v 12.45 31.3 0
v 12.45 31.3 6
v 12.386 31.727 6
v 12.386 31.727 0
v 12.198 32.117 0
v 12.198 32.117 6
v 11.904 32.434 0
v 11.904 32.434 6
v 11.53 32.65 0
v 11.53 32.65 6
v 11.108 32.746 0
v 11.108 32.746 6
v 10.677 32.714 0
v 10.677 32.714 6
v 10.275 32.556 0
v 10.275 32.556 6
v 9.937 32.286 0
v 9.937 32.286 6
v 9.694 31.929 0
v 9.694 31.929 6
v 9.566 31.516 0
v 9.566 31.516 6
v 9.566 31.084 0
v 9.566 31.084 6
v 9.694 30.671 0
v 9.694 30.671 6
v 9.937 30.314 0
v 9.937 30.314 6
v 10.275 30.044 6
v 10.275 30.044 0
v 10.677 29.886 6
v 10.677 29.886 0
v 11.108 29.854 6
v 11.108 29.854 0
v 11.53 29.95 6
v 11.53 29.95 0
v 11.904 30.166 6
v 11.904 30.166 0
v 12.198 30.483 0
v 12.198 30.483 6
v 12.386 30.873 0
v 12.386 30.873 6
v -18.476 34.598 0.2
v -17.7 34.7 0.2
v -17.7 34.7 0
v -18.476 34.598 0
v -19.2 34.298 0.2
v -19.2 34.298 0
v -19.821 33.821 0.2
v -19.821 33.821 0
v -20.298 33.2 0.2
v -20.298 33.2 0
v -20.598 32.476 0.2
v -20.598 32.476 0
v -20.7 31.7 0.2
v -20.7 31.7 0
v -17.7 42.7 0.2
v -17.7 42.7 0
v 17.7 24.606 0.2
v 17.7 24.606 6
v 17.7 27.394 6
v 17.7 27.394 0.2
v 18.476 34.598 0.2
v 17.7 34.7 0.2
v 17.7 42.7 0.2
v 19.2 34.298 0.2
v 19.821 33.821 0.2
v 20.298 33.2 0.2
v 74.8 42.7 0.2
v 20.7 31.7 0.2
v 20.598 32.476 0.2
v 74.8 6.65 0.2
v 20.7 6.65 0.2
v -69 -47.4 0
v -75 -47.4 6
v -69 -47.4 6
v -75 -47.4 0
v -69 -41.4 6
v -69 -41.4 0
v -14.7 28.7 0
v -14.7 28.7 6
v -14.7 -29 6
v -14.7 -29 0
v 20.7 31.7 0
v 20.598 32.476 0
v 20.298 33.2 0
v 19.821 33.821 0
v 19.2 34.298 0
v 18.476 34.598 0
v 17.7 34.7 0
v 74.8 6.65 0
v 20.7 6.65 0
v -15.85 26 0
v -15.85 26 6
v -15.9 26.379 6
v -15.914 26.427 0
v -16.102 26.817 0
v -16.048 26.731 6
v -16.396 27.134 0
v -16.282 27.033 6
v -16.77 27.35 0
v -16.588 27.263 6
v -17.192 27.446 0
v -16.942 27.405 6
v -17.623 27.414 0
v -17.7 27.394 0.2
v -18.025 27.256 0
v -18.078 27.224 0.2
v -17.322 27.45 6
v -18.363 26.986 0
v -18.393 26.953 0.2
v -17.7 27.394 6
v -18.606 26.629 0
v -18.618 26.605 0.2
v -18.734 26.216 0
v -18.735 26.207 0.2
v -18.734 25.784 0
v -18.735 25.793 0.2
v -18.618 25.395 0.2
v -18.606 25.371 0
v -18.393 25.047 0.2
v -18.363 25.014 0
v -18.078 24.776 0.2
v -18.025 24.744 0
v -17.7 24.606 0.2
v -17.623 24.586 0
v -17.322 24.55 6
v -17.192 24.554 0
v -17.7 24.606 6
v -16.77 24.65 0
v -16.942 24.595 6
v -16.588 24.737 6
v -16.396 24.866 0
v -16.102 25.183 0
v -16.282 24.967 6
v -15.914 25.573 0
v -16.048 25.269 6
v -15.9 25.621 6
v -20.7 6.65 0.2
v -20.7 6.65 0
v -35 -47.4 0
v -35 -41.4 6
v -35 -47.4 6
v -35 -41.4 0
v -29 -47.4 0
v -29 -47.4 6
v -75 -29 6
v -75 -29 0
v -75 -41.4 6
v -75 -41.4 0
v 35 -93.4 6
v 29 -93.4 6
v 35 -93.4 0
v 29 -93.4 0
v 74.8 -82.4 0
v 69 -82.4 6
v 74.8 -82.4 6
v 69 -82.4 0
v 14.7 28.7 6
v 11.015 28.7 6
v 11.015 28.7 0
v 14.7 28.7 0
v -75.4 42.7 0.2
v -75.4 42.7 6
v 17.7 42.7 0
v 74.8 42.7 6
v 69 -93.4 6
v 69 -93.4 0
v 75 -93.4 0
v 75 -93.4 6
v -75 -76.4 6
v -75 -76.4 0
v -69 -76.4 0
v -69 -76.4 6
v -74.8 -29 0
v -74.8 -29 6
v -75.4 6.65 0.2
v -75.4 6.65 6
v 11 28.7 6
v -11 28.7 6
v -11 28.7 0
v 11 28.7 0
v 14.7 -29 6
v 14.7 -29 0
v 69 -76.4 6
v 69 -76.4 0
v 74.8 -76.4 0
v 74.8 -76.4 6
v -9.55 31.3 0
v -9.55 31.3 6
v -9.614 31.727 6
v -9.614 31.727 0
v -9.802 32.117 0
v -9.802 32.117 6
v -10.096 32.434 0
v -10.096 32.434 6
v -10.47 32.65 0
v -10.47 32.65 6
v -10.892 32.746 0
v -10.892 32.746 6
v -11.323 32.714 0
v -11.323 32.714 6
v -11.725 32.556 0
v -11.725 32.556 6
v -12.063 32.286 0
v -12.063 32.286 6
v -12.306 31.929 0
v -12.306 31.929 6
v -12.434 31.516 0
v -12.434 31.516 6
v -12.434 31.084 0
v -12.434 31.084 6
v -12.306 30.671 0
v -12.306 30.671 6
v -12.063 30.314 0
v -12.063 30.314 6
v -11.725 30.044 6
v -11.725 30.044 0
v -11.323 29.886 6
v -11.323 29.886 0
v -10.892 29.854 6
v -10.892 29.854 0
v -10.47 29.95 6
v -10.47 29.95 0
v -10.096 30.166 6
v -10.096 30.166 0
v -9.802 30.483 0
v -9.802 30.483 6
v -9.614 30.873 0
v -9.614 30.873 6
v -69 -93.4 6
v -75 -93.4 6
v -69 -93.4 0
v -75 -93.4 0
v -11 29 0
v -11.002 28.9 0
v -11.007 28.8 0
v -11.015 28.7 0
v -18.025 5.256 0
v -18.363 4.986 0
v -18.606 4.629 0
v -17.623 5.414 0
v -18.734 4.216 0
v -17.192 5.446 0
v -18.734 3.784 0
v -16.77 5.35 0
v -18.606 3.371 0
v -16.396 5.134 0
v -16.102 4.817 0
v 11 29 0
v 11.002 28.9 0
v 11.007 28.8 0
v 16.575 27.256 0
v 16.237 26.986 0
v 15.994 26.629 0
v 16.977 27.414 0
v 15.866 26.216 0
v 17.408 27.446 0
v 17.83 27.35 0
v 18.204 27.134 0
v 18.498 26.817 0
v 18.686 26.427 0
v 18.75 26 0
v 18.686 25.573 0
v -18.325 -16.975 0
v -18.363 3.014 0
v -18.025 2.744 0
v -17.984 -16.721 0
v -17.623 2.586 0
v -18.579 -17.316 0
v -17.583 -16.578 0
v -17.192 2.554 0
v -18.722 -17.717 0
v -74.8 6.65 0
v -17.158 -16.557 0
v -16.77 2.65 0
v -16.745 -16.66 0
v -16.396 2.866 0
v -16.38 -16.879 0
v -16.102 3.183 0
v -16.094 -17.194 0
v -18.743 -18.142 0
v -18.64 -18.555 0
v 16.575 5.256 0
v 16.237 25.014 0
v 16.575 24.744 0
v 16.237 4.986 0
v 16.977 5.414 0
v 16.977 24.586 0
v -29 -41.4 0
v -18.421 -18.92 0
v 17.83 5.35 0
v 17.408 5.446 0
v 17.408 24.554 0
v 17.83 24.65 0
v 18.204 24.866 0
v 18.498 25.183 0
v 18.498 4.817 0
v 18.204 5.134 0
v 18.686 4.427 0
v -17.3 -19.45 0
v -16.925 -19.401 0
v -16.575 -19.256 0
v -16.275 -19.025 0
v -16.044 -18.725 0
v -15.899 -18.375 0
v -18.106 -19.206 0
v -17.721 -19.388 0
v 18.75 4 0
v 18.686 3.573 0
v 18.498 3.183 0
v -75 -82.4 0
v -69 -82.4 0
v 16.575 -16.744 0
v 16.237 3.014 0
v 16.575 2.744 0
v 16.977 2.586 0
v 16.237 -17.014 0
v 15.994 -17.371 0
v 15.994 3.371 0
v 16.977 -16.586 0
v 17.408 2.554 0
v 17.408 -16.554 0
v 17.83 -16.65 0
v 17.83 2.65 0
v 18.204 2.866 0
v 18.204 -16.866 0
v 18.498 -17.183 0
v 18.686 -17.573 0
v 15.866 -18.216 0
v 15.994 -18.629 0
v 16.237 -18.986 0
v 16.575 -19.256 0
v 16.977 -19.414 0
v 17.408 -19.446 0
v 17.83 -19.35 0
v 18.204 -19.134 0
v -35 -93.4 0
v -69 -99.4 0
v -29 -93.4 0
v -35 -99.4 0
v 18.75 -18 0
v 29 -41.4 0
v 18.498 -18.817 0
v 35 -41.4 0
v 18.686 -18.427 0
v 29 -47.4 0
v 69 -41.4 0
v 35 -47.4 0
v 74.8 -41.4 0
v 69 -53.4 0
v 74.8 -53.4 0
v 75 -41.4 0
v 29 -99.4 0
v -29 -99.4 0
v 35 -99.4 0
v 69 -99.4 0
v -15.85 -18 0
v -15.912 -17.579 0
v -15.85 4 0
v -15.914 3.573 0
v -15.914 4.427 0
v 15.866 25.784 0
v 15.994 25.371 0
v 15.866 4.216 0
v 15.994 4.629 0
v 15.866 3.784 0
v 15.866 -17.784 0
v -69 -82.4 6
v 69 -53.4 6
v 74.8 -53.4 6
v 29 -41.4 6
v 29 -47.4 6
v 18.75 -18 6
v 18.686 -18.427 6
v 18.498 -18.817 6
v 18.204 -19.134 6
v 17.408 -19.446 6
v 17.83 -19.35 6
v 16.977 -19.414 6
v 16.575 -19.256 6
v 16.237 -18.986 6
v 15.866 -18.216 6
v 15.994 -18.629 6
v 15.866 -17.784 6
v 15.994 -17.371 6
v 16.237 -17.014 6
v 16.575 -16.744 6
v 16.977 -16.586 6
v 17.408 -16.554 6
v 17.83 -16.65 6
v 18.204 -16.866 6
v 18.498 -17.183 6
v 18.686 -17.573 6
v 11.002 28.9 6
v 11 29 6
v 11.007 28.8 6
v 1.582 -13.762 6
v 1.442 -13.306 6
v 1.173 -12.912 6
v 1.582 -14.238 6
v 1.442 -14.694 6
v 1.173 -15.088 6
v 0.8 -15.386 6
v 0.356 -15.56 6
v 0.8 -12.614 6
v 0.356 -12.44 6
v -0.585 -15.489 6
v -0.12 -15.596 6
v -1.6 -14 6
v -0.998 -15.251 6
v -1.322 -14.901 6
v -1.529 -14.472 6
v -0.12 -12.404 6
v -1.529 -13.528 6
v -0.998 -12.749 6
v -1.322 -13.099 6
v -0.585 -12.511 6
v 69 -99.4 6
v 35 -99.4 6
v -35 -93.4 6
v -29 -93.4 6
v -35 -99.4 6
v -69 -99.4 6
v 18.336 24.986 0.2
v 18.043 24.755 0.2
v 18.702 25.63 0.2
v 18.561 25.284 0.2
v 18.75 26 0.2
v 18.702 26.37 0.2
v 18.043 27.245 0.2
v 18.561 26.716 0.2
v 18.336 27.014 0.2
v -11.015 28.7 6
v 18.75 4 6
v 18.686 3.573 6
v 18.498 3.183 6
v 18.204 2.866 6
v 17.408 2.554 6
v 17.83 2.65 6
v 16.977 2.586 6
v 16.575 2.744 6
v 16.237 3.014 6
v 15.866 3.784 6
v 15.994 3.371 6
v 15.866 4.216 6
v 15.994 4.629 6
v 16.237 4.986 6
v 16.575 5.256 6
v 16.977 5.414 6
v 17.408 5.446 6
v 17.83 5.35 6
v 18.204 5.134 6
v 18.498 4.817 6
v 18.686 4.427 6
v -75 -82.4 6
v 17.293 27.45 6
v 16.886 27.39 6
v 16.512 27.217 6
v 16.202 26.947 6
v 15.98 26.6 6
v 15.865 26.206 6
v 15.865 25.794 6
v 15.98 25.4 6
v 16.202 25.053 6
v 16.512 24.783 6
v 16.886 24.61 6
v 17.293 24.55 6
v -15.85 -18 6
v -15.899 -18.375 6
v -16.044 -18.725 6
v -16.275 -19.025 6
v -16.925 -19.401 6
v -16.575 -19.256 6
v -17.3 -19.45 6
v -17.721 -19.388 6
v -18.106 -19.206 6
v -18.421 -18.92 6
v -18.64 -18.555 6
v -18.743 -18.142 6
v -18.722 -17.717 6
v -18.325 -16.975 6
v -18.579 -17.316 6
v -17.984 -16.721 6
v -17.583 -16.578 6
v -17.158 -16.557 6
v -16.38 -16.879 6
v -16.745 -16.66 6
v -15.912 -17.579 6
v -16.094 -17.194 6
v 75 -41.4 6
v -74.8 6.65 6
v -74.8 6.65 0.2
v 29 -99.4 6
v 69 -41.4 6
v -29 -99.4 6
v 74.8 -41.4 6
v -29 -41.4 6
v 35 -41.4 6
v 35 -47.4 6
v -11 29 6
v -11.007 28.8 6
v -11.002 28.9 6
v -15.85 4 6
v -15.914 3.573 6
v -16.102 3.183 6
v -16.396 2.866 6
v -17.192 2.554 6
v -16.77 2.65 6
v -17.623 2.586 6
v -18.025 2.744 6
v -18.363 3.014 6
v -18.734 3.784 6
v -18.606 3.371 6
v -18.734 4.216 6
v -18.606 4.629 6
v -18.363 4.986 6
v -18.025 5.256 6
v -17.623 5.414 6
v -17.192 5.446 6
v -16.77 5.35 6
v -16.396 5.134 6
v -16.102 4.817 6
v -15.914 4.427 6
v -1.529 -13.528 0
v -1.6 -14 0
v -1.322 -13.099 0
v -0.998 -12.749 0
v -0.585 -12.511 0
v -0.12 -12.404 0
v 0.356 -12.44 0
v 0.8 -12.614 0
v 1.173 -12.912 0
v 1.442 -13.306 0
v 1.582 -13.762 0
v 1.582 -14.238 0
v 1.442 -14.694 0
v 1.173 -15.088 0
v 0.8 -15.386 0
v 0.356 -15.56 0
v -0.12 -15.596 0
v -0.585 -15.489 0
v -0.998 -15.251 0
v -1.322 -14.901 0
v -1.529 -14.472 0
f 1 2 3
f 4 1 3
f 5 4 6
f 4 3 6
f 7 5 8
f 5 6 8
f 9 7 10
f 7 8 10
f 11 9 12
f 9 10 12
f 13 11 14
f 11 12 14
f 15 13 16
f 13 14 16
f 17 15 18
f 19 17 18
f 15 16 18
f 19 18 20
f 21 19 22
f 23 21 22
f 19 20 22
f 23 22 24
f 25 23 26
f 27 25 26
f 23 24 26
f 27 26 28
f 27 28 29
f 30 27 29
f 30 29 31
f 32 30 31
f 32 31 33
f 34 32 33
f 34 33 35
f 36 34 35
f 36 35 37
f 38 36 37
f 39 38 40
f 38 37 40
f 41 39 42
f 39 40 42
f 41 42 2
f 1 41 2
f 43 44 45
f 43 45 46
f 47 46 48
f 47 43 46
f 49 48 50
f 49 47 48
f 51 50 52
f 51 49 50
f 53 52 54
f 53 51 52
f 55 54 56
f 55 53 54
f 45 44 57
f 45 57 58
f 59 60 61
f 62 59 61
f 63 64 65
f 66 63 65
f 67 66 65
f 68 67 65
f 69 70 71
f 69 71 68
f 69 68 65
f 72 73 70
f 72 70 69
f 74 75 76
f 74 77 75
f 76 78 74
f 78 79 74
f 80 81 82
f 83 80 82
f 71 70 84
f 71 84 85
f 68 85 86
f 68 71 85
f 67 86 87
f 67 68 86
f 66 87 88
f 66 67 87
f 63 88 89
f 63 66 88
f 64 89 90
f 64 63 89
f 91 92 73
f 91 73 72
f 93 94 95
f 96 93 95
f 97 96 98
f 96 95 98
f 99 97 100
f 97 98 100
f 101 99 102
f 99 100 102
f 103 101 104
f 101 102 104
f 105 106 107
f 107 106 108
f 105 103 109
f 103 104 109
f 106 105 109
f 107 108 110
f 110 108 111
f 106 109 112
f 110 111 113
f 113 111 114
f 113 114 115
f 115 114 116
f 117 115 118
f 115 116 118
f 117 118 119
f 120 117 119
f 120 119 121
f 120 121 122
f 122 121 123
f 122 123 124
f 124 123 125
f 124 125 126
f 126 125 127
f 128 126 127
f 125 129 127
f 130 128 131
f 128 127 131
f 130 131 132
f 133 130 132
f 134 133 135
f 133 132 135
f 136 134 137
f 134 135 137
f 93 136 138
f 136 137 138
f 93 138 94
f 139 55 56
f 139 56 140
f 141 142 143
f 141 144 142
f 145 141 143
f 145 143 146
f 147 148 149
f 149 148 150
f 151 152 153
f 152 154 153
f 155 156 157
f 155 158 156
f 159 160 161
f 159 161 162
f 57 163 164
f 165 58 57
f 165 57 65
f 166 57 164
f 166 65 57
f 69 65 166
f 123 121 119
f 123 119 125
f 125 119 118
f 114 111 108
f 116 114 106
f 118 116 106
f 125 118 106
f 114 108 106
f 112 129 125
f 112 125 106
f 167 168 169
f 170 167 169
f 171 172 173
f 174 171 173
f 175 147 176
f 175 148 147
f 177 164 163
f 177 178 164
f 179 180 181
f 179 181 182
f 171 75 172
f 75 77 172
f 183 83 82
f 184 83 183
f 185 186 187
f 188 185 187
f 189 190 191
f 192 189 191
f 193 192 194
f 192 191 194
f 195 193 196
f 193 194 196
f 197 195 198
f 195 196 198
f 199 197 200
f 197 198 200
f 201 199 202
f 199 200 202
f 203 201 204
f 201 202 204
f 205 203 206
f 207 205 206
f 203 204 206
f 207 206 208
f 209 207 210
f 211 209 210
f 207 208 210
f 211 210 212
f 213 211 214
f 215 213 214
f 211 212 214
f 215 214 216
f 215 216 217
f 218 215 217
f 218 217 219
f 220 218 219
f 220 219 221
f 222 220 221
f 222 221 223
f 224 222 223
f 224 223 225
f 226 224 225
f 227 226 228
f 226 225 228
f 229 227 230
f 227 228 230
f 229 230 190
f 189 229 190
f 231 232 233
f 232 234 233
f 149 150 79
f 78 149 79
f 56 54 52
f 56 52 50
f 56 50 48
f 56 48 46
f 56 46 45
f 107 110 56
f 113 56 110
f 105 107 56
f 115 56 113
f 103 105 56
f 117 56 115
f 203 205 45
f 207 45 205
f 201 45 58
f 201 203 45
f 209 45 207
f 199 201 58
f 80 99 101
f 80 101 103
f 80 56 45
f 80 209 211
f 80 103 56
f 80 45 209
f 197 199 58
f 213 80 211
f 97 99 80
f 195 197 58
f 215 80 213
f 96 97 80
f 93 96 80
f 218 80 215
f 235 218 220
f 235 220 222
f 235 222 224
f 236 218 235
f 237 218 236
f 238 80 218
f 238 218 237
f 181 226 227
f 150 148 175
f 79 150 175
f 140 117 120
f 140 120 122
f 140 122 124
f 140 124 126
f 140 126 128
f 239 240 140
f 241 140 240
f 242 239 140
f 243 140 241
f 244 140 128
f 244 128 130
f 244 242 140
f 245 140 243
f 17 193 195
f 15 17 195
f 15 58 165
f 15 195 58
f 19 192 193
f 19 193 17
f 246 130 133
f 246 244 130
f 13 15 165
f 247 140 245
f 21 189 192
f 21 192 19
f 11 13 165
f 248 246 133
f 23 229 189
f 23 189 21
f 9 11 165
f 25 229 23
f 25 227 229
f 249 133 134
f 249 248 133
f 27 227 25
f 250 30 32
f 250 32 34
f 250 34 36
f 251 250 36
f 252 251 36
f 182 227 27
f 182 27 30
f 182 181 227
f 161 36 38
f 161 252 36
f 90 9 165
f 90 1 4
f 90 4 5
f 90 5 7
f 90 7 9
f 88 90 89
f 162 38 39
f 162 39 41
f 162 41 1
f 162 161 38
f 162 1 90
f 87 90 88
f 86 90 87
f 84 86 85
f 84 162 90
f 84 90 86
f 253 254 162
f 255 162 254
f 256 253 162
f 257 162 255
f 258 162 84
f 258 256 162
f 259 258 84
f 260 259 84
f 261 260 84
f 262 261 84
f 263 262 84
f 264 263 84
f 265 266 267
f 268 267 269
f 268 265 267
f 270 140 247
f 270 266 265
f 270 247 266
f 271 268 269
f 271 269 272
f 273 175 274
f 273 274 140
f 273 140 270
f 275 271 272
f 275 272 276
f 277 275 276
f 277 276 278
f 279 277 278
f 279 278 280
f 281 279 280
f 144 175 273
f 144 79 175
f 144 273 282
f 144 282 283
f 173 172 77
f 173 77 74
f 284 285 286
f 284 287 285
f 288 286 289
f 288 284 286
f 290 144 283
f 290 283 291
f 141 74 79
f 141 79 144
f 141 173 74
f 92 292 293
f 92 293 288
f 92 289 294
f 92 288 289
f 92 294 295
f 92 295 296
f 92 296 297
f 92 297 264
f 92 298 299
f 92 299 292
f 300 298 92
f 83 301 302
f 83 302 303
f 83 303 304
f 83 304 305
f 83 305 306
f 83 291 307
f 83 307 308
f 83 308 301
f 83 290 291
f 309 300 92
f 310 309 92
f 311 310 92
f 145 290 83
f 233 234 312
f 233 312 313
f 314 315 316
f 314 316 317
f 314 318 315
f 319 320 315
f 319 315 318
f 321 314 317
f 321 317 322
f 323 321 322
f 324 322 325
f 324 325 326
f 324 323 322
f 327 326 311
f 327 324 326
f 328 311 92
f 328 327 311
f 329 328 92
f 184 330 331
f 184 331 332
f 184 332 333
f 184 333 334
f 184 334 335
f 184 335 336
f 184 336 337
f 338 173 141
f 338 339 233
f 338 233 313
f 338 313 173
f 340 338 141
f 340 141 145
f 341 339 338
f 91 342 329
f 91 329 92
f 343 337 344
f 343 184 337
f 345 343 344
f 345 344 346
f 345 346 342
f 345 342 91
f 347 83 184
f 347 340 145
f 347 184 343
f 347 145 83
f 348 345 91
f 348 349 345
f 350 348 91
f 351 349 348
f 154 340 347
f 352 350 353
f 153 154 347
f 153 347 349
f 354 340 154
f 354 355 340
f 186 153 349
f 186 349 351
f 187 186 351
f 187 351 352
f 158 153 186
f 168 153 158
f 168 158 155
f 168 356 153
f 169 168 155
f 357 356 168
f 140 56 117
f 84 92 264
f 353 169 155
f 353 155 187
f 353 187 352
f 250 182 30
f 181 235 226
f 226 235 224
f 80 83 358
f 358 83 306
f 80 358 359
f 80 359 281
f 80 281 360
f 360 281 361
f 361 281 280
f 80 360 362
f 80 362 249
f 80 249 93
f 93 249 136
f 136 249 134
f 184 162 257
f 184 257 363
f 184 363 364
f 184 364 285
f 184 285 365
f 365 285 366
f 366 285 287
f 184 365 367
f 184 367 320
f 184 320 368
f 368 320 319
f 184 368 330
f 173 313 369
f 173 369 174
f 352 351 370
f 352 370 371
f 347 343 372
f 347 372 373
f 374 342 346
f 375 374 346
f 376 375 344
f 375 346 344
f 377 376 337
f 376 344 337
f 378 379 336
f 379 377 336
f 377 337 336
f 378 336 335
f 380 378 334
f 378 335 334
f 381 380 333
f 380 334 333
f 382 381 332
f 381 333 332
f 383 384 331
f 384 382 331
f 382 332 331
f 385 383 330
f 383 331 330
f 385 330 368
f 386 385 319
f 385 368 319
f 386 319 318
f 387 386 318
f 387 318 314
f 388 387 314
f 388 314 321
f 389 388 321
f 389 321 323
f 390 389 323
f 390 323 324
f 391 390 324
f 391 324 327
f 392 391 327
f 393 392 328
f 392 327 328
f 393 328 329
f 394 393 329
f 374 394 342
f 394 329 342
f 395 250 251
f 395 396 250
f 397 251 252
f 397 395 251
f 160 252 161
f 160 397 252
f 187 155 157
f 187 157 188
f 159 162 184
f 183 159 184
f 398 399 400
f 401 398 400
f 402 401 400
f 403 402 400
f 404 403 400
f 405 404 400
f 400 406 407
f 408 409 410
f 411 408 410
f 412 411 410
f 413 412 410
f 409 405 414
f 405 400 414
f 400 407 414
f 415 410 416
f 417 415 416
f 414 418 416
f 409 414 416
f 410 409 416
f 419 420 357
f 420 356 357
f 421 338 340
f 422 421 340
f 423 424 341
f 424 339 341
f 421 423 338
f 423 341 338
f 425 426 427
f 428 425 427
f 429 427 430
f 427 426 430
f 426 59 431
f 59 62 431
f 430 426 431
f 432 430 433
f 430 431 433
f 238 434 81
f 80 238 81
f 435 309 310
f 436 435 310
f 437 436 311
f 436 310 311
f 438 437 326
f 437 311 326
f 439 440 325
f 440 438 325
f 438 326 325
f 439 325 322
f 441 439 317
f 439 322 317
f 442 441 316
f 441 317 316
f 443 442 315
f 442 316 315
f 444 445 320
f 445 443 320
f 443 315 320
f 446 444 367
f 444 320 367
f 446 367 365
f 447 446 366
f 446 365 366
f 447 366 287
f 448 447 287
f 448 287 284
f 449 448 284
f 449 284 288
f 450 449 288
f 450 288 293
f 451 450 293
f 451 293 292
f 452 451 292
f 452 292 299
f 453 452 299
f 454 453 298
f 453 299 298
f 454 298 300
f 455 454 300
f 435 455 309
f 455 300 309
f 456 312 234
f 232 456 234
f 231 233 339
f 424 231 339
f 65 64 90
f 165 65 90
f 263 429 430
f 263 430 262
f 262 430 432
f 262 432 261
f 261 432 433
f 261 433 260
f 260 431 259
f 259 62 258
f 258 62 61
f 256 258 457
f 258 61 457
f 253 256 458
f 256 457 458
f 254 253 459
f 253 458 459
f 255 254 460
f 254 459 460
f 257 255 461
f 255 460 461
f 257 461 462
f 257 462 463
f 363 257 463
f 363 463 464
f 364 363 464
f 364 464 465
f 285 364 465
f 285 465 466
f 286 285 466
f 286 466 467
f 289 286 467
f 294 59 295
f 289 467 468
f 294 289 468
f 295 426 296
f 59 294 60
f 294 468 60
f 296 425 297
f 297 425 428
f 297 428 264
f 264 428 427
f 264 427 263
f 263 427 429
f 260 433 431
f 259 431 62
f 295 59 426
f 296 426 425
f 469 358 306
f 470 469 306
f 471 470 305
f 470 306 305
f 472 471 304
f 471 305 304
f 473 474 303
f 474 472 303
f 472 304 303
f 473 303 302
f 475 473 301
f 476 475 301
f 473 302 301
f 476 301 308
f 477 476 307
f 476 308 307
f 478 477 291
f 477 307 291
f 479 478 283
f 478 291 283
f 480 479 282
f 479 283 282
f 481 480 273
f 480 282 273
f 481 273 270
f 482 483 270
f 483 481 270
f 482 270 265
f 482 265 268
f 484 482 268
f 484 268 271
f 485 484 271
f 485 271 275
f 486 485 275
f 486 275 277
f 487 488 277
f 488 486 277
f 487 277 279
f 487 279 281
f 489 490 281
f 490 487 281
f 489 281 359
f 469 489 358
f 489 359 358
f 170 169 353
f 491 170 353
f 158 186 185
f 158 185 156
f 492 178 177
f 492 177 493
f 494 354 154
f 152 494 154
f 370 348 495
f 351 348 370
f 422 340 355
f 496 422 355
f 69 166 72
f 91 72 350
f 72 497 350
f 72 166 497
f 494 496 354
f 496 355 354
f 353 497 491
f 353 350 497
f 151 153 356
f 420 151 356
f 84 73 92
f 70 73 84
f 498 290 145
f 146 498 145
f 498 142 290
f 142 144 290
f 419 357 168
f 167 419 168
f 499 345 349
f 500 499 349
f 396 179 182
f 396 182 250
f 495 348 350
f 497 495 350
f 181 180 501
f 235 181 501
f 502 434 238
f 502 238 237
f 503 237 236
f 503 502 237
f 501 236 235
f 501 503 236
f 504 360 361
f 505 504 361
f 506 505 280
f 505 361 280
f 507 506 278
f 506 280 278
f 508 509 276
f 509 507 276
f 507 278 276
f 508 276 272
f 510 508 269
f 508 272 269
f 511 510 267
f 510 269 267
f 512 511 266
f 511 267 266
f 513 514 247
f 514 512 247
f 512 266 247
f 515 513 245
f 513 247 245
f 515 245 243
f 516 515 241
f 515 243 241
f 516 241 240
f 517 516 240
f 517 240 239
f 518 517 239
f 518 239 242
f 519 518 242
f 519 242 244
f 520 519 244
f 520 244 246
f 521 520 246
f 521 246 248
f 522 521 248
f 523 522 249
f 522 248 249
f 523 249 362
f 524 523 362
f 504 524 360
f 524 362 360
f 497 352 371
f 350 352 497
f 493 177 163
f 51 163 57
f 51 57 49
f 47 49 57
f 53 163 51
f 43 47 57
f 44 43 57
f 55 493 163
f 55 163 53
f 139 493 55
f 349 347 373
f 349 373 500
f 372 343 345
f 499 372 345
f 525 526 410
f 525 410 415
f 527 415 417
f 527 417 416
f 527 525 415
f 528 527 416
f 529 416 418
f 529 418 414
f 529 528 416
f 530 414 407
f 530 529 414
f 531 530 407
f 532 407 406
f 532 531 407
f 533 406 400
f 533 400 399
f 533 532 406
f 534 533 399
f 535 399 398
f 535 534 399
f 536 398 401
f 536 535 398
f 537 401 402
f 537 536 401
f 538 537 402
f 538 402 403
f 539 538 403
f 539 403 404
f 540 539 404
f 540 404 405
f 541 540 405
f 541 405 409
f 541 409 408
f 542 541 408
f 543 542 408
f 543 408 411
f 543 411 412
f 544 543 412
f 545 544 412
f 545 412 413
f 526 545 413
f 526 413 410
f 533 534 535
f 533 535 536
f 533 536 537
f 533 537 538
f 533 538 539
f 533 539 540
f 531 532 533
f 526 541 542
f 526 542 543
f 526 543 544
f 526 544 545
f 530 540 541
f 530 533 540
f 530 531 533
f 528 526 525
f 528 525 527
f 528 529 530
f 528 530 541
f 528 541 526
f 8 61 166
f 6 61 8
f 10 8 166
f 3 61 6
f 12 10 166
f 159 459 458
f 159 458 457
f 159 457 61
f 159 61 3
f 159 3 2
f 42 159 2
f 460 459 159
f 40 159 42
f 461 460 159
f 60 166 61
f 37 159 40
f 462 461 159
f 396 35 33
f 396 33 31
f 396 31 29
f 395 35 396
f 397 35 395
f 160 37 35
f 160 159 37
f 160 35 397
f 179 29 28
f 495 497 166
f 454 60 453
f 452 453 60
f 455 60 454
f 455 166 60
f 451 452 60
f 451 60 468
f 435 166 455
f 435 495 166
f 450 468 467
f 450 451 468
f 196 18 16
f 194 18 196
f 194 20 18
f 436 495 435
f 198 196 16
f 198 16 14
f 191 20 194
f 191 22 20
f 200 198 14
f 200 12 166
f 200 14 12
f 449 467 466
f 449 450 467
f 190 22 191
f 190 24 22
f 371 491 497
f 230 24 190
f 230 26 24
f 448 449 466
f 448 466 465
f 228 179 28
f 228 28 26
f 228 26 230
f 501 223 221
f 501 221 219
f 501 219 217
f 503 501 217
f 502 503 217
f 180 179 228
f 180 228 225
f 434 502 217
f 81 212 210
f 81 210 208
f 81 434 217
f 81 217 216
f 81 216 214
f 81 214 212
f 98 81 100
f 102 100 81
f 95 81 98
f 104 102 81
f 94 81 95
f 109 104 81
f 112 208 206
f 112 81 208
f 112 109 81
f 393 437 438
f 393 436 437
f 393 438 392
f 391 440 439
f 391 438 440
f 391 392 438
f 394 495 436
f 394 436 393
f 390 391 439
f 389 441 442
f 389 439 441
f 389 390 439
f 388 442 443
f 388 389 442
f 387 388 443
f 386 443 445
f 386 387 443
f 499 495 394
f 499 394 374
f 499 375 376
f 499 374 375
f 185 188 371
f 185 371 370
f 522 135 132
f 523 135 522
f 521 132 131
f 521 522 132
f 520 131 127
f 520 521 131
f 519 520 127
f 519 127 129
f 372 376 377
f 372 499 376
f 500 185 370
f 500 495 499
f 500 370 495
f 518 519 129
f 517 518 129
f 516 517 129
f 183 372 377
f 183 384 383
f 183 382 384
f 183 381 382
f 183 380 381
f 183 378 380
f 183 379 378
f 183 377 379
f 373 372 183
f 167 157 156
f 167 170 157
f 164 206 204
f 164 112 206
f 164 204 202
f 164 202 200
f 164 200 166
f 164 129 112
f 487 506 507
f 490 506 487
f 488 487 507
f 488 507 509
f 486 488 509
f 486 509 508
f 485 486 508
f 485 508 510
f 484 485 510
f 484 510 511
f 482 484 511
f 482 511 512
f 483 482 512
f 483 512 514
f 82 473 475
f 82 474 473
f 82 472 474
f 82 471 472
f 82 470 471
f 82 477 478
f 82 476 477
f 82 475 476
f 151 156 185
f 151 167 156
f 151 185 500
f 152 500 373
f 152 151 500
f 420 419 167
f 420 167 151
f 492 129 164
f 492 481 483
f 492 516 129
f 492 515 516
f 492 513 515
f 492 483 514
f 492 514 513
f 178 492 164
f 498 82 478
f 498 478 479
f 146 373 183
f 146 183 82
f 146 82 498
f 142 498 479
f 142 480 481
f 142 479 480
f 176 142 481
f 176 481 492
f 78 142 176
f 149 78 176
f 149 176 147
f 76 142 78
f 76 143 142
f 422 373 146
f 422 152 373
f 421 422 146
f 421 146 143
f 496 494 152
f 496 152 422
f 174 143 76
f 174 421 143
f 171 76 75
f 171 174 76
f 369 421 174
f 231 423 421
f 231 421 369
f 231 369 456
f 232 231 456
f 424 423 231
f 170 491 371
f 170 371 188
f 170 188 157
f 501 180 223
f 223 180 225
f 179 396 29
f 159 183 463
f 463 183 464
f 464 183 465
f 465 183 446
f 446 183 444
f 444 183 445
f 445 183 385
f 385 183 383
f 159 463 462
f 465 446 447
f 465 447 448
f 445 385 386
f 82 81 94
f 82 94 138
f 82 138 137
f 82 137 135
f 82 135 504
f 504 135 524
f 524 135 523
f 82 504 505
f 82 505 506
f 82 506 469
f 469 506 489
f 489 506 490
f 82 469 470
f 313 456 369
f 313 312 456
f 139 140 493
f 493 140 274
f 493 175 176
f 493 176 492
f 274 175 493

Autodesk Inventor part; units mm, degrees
ref_plane "YZ Plane" through (0, 0, 0) normal (1, 0, 0) x (0, 1, 0)
ref_plane "XZ Plane" through (0, 0, 0) normal (0, 1, 0) x (-1, 0, 0)
ref_plane "XY Plane" through (0, 0, 0) normal (0, 0, 1) x (1, 0, 0)
sketch "스케치1" plane through (0, 0, 0) normal (0, 0, 1) x (1, 0, 0)
  arc A0 (-19.5808, 6.2636) -> (-20.1, 4.5766) centre (-17.1, 4.5766) ccw projected
  line L0 (-20.1, -39.6766) -> (-20.1, 4.5766) projected
  arc A1 (-20.1, -39.6766) -> (-19.5808, -41.3636) centre (-17.1, -39.6766) ccw projected
  line L1 (-15.8929, -46.7869) -> (-19.5808, -41.3636) projected
  arc A2 (-15.8929, -46.7869) -> (-13.4121, -48.1) centre (-13.4121, -45.1) ccw projected
  line L2 (13.4121, -48.1) -> (-13.4121, -48.1) projected
  arc A3 (13.4121, -48.1) -> (15.8929, -46.7869) centre (13.4121, -45.1) ccw projected
  line L3 (19.5808, -41.3636) -> (15.8929, -46.7869) projected
  arc A4 (19.5808, -41.3636) -> (20.1, -39.6766) centre (17.1, -39.6766) ccw projected
  line L4 (20.1, 4.5766) -> (20.1, -39.6766) projected
  arc A5 (20.1, 4.5766) -> (19.5808, 6.2636) centre (17.1, 4.5766) ccw projected
  line L5 (15.5953, 12.1246) -> (19.5808, 6.2636) projected
  arc A6 (15.5953, 12.1246) -> (13.9414, 13) centre (13.9414, 11) ccw projected
  line L6 (7.65, 13) -> (13.9414, 13) projected
  arc A7 (9.15, 11.5) -> (7.65, 13) centre (7.65, 11.5) ccw projected
  line L7 (9.15, 11.5) -> (9.15, 10) projected
  arc A8 (9.15, 10) -> (11.5, 7.65) centre (11.5, 10) ccw projected
  line L8 (11.5, 7.65) -> (13.5, 7.65) projected
  arc A9 (14.5, 6.65) -> (13.5, 7.65) centre (13.5, 6.65) ccw projected
  line L9 (14.5, 6.65) -> (14.5, -36.15) projected
  arc A10 (13.5, -37.15) -> (14.5, -36.15) centre (13.5, -36.15) ccw projected
  line L10 (13.5, -37.15) -> (11.5, -37.15) projected
  arc A11 (11.5, -37.15) -> (9.15, -39.5) centre (11.5, -39.5) ccw projected
  line L11 (9.15, -39.5) -> (9.15, -41.5) projected
  arc A12 (8.15, -42.5) -> (9.15, -41.5) centre (8.15, -41.5) ccw projected
  line L12 (8.15, -42.5) -> (-8.15, -42.5) projected
  arc A13 (-9.15, -41.5) -> (-8.15, -42.5) centre (-8.15, -41.5) ccw projected
  line L13 (-9.15, -41.5) -> (-9.15, -39.5) projected
  arc A14 (-9.15, -39.5) -> (-11.5, -37.15) centre (-11.5, -39.5) ccw projected
  line L14 (-11.5, -37.15) -> (-13.5, -37.15) projected
  arc A15 (-14.5, -36.15) -> (-13.5, -37.15) centre (-13.5, -36.15) ccw projected
  line L15 (-14.5, -36.15) -> (-14.5, 6.65) projected
  arc A16 (-13.5, 7.65) -> (-14.5, 6.65) centre (-13.5, 6.65) ccw projected
  line L16 (-13.5, 7.65) -> (-11.5, 7.65) projected
  arc A17 (-11.5, 7.65) -> (-9.15, 10) centre (-11.5, 10) ccw projected
  line L17 (-9.15, 10) -> (-9.15, 11.5) projected
  arc A18 (-7.65, 13) -> (-9.15, 11.5) centre (-7.65, 11.5) ccw projected
  line L18 (-13.9414, 13) -> (-7.65, 13) projected
  arc A19 (-13.9414, 13) -> (-15.5953, 12.1246) centre (-13.9414, 11) ccw projected
  line L19 (-19.5808, 6.2636) -> (-15.5953, 12.1246) projected
  circle A20 centre (11, -45.3) radius 1.35 projected
  circle A21 centre (-11, -45.3) radius 1.35 projected
  circle A22 centre (17.3, -40) radius 1.35 projected
  circle A23 centre (-17.3, -40) radius 1.35 projected
  line L20 (-17.3, -18) -> (-17.3, -40)
  line L21 (-17.3, -29) -> (-18.1, -29)
  line L22 (-17.3, -29) -> (-14.5, -29)
  line L23 (-14.5, 6.65) -> (-14.5, -36.15)
  line L24 (-20.1, -27) -> (-20.1, 4.5766)
  line L25 (0, 0) -> (0, -14)
  line L26 (-14.5, 6.65) -> (-14.7, 6.65)
  line L27 (-14.7, 6.65) -> (-14.7, -36.15)
  line L28 (-14.7, -36.15) -> (-14.5, -36.15)
  line L29 (-14.5, 6.65) -> (-18.1, 6.65)
  line L30 (-20.1, 4.65) -> (-20.1, 4.5766)
  arc A24 (-18.1, 6.65) -> (-20.1, 4.65) centre (-18.1, 4.65) ccw
  arc A25 (-20.1, -27) -> (-18.1, -29) centre (-18.1, -27) ccw
  line L31 (20.1, -39.6766) -> (20.1, 4.5766)
  line L32 (17.3, -29) -> (14.5, -29)
  line L33 (14.7, 6.65) -> (14.7, -36.15)
  arc A26 (20.1, 4.65) -> (18.1, 6.65) centre (18.1, 4.65) ccw
  arc A27 (18.1, -29) -> (20.1, -27) centre (18.1, -27) ccw
  line L34 (17.3, -29) -> (18.1, -29)
  line L35 (14.7, 6.65) -> (18.1, 6.65)
  line L36 (-20.1, 6.65) -> (-38.1, 6.65)
  line L37 (-38.1, 6.65) -> (-38.1, -29)
  line L38 (-38.1, -29) -> (-20.1, -29)
  line L39 (-20.1, -29) -> (-20.1, 6.65)
  line L40 (20.1, 6.65) -> (38.1, 6.65)
  line L41 (38.1, 6.65) -> (38.1, -29)
  line L42 (38.1, -29) -> (20.1, -29)
  line L43 (20.1, -29) -> (20.1, 6.65)
  line L44 (-18.1, 6.65) -> (-20.1, 6.65)
  line L45 (-17.3, -29) -> (-20.1, -29)
  line L46 (20.1, -29) -> (18.1, -29)
  line L47 (20.1, 6.65) -> (14.5, 6.65)
  line L48 (-32.5405, -23.1017) -> (-32.4592, -49.1016) projected
  line L49 (-32.5221, -29) -> (-38.1, -29)
  line L50 (-38.1, -29) -> (-38.1, 6.65)
  line L51 (-38.1, 6.65) -> (-32.5221, 6.65)
  line L52 (-32.5221, 6.65) -> (-32.5221, -29)
  line L53 (-32.5221, -29) -> (-32.3221, -29)
  line L54 (-32.3221, -29) -> (-32.3221, 6.65)
  line L55 (32.3221, -29) -> (32.3221, 6.65)
  line L56 (31.5, -1) -> (31.5, -27) projected
  line L57 (-31.5, -1) -> (-31.5, -27) projected
  line L58 (31.5, -29) -> (20.1, -29)
  line L59 (20.1, -29) -> (20.1, 6.65)
  line L60 (20.1, 6.65) -> (31.5, 6.65)
  line L61 (-31.5, -29) -> (-20.1, -29)
  line L62 (-20.1, -29) -> (-20.1, 6.65)
  line L63 (-20.1, 6.65) -> (-31.5, 6.65)
  line L64 (31.5, -29) -> (31.4, -29)
  line L65 (31.4, -29) -> (31.4, -28)
  line L66 (31.4, -28) -> (31.5, -28)
  line L67 (31.5, -28) -> (31.5, -29)
  line L68 (31.4, -28) -> (31.4, 6.65)
  line L69 (-31.5, -29) -> (-31.4, -29)
  line L70 (-31.4, -29) -> (-31.4, 6.65)
  line L71 (31.5, -28) -> (31.5, -27)
  line L72 (-75, -22.9383) -> (-75, -5.0617)
  line L73 (-31.4, -29) -> (-74.8, -29)
  line L74 (-74.8, -29) -> (-74.8, 6.65)
  line L75 (-74.8, 6.65) -> (-31.4, 6.65)
  line L76 (-31.4, 6.65) -> (-31.4, -29)
  line L77 (20.1, 6.65) -> (38.1, 6.65)
  line L78 (38.1, 6.65) -> (38.1, -29)
  line L79 (38.1, -29) -> (20.1, -29)
  line L80 (32.5405, -23.1017) -> (32.4592, -49.1016)
  line L81 (32.5221, -29) -> (38.1, -29)
  line L82 (38.1, -29) -> (38.1, 6.65)
  line L83 (38.1, 6.65) -> (32.5221, 6.65)
  line L84 (32.5221, 6.65) -> (32.5221, -29)
  line L85 (32.5221, -29) -> (32.3221, -29)
  line L86 (32.3221, -29) -> (32.3221, 6.65)
  line L87 (31.5, -1) -> (31.5, -27)
  line L88 (31.5, -29) -> (20.1, -29)
  line L89 (20.1, 6.65) -> (31.5, 6.65)
  line L90 (31.5, -29) -> (31.4, -29)
  line L91 (31.4, -29) -> (31.4, 6.65)
  line L92 (75, -22.9383) -> (75, -5.0617)
  line L93 (31.4, -29) -> (74.8, -29)
  line L94 (74.8, -29) -> (74.8, 6.65)
  line L95 (74.8, 6.65) -> (31.4, 6.65)
  line L96 (31.4, 6.65) -> (31.4, -29)
  circle A28 centre (17.3, 4) radius 1.45
  circle A29 centre (17.3, -18) radius 1.45
  circle A30 centre (-17.3, 4) radius 1.45
  circle A31 centre (-17.3, -18) radius 1.45
  point P0 (-20.1, -29)
  point P1 (-14.7, -29)
  point P2 (-20.0735, 4.9745)
  point P3 (20.0735, 4.9745)
  point P4 (14.7, -29)
  point P5 (-75, -5.0617)
  dimension "d0" = 0.2
  dimension "d1" = 2
  dimension "d4" = 18
  dimension "d5" = 18
  dimension "d16" = 0.2
  dimension "d17" = 0.1
  dimension "d18" = 0.1
extrude "돌출1" add sketch "스케치1" along normal blind 6 contours A0 A24 L29 L27 L22 L21 A25 L0 | L39 L44 L19 A0 | A0 L0 L38 L70 L36 L39 | A0 L19 L44 A24 | A25 L45 L0 | L70 L38 L54 L36 | L54 L38 L52 L36 | L52 L38 L37 L36 | L37 L73 L74 L75 | L46 A27 L4 | L4 A5 L43 L40 L68 L65 L42 | A27 L34 L32 L33 L35 A26 A5 L4 | L65 L66 L67 L42 | L67 L66 L68 L40 L55 L42 | A5 L5 L47 L43 | L55 L40 L84 L42 | A26 L47 L5 A5 | L84 L40 L41 L42 | L41 L95 L94 L93
sketch "스케치5" plane through (0, 0, 6) normal (0, 0, 1) x (1, 0, 0)
  arc A0 (19.5808, -20.2636) -> (20.1, -18.5766) centre (17.1, -18.5766) ccw projected
  line L0 (20.1, 25.6766) -> (20.1, -18.5766) projected
  arc A1 (20.1, 25.6766) -> (19.5808, 27.3636) centre (17.1, 25.6766) ccw
  line L1 (15.8929, 32.7869) -> (19.5808, 27.3636) projected
  arc A2 (15.8929, 32.7869) -> (13.4121, 34.1) centre (13.4121, 31.1) ccw projected
  line L2 (-13.4121, 34.1) -> (13.4121, 34.1) projected
  arc A3 (-13.4121, 34.1) -> (-15.8929, 32.7869) centre (-13.4121, 31.1) ccw projected
  line L3 (-19.5808, 27.3636) -> (-15.8929, 32.7869) projected
  arc A4 (-19.5808, 27.3636) -> (-20.1, 25.6766) centre (-17.1, 25.6766) ccw projected
  line L4 (-20.1, -18.5766) -> (-20.1, 25.6766) projected
  arc A5 (-20.1, -18.5766) -> (-19.5808, -20.2636) centre (-17.1, -18.5766) ccw projected
  line L5 (-15.5953, -26.1246) -> (-19.5808, -20.2636) projected
  arc A6 (-15.5953, -26.1246) -> (-13.9414, -27) centre (-13.9414, -25) ccw projected
  line L6 (-7.65, -27) -> (-13.9414, -27) projected
  arc A7 (-9.15, -25.5) -> (-7.65, -27) centre (-7.65, -25.5) ccw projected
  line L7 (-9.15, -25.5) -> (-9.15, -24) projected
  arc A8 (-9.15, -24) -> (-11.5, -21.65) centre (-11.5, -24) ccw projected
  line L8 (-11.5, -21.65) -> (-13.5, -21.65) projected
  arc A9 (-14.5, -20.65) -> (-13.5, -21.65) centre (-13.5, -20.65) ccw projected
  line L9 (-14.5, -20.65) -> (-14.5, 22.15) projected
  arc A10 (-13.5, 23.15) -> (-14.5, 22.15) centre (-13.5, 22.15) ccw projected
  line L10 (-13.5, 23.15) -> (-11.5, 23.15) projected
  arc A11 (-11.5, 23.15) -> (-9.15, 25.5) centre (-11.5, 25.5) ccw projected
  line L11 (-9.15, 25.5) -> (-9.15, 27.5) projected
  arc A12 (-8.15, 28.5) -> (-9.15, 27.5) centre (-8.15, 27.5) ccw projected
  line L12 (-8.15, 28.5) -> (8.15, 28.5) projected
  arc A13 (9.15, 27.5) -> (8.15, 28.5) centre (8.15, 27.5) ccw projected
  line L13 (9.15, 27.5) -> (9.15, 25.5) projected
  arc A14 (9.15, 25.5) -> (11.5, 23.15) centre (11.5, 25.5) ccw projected
  line L14 (11.5, 23.15) -> (13.5, 23.15) projected
  arc A15 (14.5, 22.15) -> (13.5, 23.15) centre (13.5, 22.15) ccw projected
  line L15 (14.5, 22.15) -> (14.5, -20.65) projected
  arc A16 (13.5, -21.65) -> (14.5, -20.65) centre (13.5, -20.65) ccw projected
  line L16 (13.5, -21.65) -> (11.5, -21.65) projected
  arc A17 (11.5, -21.65) -> (9.15, -24) centre (11.5, -24) ccw projected
  line L17 (9.15, -24) -> (9.15, -25.5) projected
  arc A18 (7.65, -27) -> (9.15, -25.5) centre (7.65, -25.5) ccw projected
  line L18 (13.9414, -27) -> (7.65, -27) projected
  arc A19 (13.9414, -27) -> (15.5953, -26.1246) centre (13.9414, -25) ccw projected
  line L19 (19.5808, -20.2636) -> (15.5953, -26.1246) projected
  circle A20 centre (-17.3, -18) radius 1.35 projected
  circle A21 centre (-17.3, 4) radius 1.35 projected
  circle A22 centre (-11, 31.3) radius 1.35 projected
  circle A23 centre (17.3, -18) radius 1.35 projected
  circle A24 centre (17.3, 4) radius 1.35 projected
  line L20 (14.7, 6.65) -> (14.7, -29) projected
  line L21 (14.7, 6.65) -> (20.7, 6.65)
  line L22 (20.7, 6.65) -> (20.7, 26)
  line L23 (20.7, 26) -> (14.7, 26)
  line L24 (14.7, 26) -> (14.7, 6.65)
  line L25 (20.7, 26) -> (14, 26)
  line L26 (11, 28.5) -> (11, 34.5)
  line L27 (11, 34.5) -> (8.15, 34.5)
  line L28 (20.7, 26) -> (11, 26)
  line L29 (11, 29) -> (11, 34.5)
  line L30 (11, 34.5) -> (20.7, 34.5)
  line L31 (20.7, 31.7) -> (20.7, 26)
  line L32 (8.15, 28.5) -> (8.15, 28.7)
  line L33 (8.15, 28.7) -> (11, 28.7)
  line L34 (11, 28.7) -> (11, 34.5)
  line L35 (11, 34.5) -> (8.15, 34.5)
  line L36 (8.15, 34.5) -> (8.15, 28.7)
  line L37 (11, 34.5) -> (8.15, 34.5)
  line L38 (8.15, 34.5) -> (8.15, 34.7)
  line L39 (8.15, 34.7) -> (11, 34.7)
  line L40 (11, 34.7) -> (11, 34.5)
  line L41 (20.7, 34.5) -> (11, 34.5)
  line L42 (11, 34.5) -> (11, 34.7)
  line L43 (11, 34.7) -> (17.7, 34.7)
  line L44 (20.7, 34.7) -> (20.7, 34.5)
  line L45 (8.15, 34.7) -> (3, 34.7)
  line L46 (0, 31.7) -> (0, 28.7)
  line L47 (0, 28.7) -> (8.15, 28.7)
  line L48 (8.15, 28.7) -> (8.15, 34.7)
  arc A25 (20.7, 31.7) -> (17.7, 34.7) centre (17.7, 31.7) ccw
  arc A26 (11, 29) -> (14, 26) centre (14, 29) ccw
  arc A27 (3, 34.7) -> (0, 31.7) centre (3, 31.7) ccw
  line L49 (0, 0) -> (0, -14)
  arc A28 (-19.5808, 27.3636) -> (-20.1, 25.6766) centre (-17.1, 25.6766) ccw
  line L50 (-15.8929, 32.7869) -> (-19.5808, 27.3636)
  arc A29 (-13.4121, 34.1) -> (-15.8929, 32.7869) centre (-13.4121, 31.1) ccw
  arc A30 (-8.15, 28.5) -> (-9.15, 27.5) centre (-8.15, 27.5) ccw
  line L51 (-9.15, 27.5) -> (-9.15, 25.5)
  arc A31 (-11.5, 23.15) -> (-9.15, 25.5) centre (-11.5, 25.5) ccw
  line L52 (-11.5, 23.15) -> (-13.5, 23.15)
  arc A32 (-13.5, 23.15) -> (-14.5, 22.15) centre (-13.5, 22.15) ccw
  line L53 (-14.7, 6.65) -> (-20.7, 6.65)
  line L54 (-20.7, 6.65) -> (-20.7, 26)
  line L55 (-20.7, 26) -> (-14.7, 26)
  line L56 (-14.7, 26) -> (-14.7, 6.65)
  line L57 (-20.7, 26) -> (-14, 26)
  line L58 (-11, 28.5) -> (-11, 34.5)
  line L59 (-11, 34.5) -> (-8.15, 34.5)
  line L60 (-20.7, 26) -> (-11, 26)
  line L61 (-11, 29) -> (-11, 34.5)
  line L62 (-11, 34.5) -> (-20.7, 34.5)
  line L63 (-20.7, 31.7) -> (-20.7, 26)
  line L64 (-8.15, 28.5) -> (-8.15, 28.7)
  line L65 (-8.15, 28.7) -> (-11, 28.7)
  line L66 (-11, 28.7) -> (-11, 34.5)
  line L67 (-11, 34.5) -> (-8.15, 34.5)
  line L68 (-8.15, 34.5) -> (-8.15, 28.7)
  line L69 (-11, 34.5) -> (-8.15, 34.5)
  line L70 (-8.15, 34.5) -> (-8.15, 34.7)
  line L71 (-8.15, 34.7) -> (-11, 34.7)
  line L72 (-11, 34.7) -> (-11, 34.5)
  line L73 (-20.7, 34.5) -> (-11, 34.5)
  line L74 (-11, 34.5) -> (-11, 34.7)
  line L75 (-11, 34.7) -> (-17.7, 34.7)
  line L76 (-20.7, 34.7) -> (-20.7, 34.5)
  line L77 (-8.15, 34.7) -> (-3, 34.7)
  line L78 (0, 28.7) -> (-8.15, 28.7)
  line L79 (-8.15, 28.7) -> (-8.15, 34.7)
  arc A33 (-17.7, 34.7) -> (-20.7, 31.7) centre (-17.7, 31.7) ccw
  arc A34 (-14, 26) -> (-11, 29) centre (-14, 29) ccw
  arc A35 (0, 31.7) -> (-3, 34.7) centre (-3, 31.7) ccw
  line L80 (3, 34.7) -> (-3, 34.7)
  circle A36 centre (17.3, 26) radius 1.45
  circle A37 centre (11, 31.3) radius 1.45
  circle A38 centre (-17.3, 26) radius 1.45
  circle A39 centre (-11, 31.3) radius 1.45
  line L81 (8.15, 28.5) -> (14.5, 28.5)
  line L82 (14.5, 28.5) -> (14.5, 22.15)
  line L83 (14.5, 22.15) -> (8.15, 22.15)
  line L84 (8.15, 22.15) -> (8.15, 28.5)
  line L85 (-14.5, -20.65) -> (-7.65, -20.65)
  line L86 (-7.65, -20.65) -> (-7.65, -27)
  line L87 (-7.65, -27) -> (-14.5, -27)
  line L88 (-14.5, -27) -> (-14.5, -20.65)
  line L89 (8.15, 22.15) -> (-7.65, 22.15)
  line L90 (-7.65, 22.15) -> (-7.65, -20.65)
  line L91 (-7.65, -20.65) -> (8.15, -20.65)
  line L92 (8.15, -20.65) -> (8.15, 22.15)
  line L93 (11, 28.7) -> (14.5, 28.7)
  line L94 (14.5, 28.7) -> (14.5, 22.15)
  line L95 (14.5, 22.15) -> (11, 22.15)
  line L96 (11, 22.15) -> (11, 28.7)
  line L97 (-11, 28.7) -> (-14.7, 28.7)
  line L98 (-14.7, 28.7) -> (-14.7, 26)
  line L99 (-14.7, 26) -> (-11, 26)
  line L100 (-11, 26) -> (-11, 28.7)
  line L101 (7.65, -27) -> (14.5, -27)
  line L102 (14.5, -27) -> (14.5, -20.65)
  line L103 (14.5, -20.65) -> (7.65, -20.65)
  line L104 (7.65, -20.65) -> (7.65, -27)
  line L105 (14.7, 26) -> (14.5, 26)
  line L106 (14.5, 26) -> (14.5, 28.7)
  line L107 (14.5, 28.7) -> (14.7, 28.7)
  line L108 (14.7, 28.7) -> (14.7, 26)
  point P0 (-17.3, 4)
  point P1 (-11, 29.85)
  point P2 (-11, 29.95)
  point P3 (-11, 32.65)
  point P4 (-11, 32.75)
  point P5 (-11.015, 28.7)
  point P6 (11.015, 28.7)
  dimension "d19" = 6
  dimension "d20" = 6
  dimension "d21" = 0.2
  dimension "d22" = 0.2
  dimension "d23" = 3
extrude "돌출5" add sketch "스케치5" against normal blind 6 contours L21 L24 L23 A36 A1 L0 | L0 A1 L23 L22 L21 | L23 A36 L108 L107 L93 A26 L26 A37 L2 A2 L1 A1 | A1 L1 A2 L2 L26 L30 A25 L31 L23 | L30 L40 L43 A25 | L26 L2 L36 L27 | L27 L38 L39 L40 | L26 A37 L33 L36 L2 | L36 L2 A27 L45 L38 | L47 L46 A27 L2 L36 | L65 L58 A39 L2 L68 | L68 L2 A35 L46 L78 | A27 A35 L2 | L2 A35 L80 A27 | L68 L70 L77 A35 L2 | L2 L58 L59 L68 | A34 L97 L98 L55 A38 A4 L3 A3 L2 L58 A39 | L2 A3 L3 A4 L55 L63 A33 L62 L58 | L59 L72 L71 L70 | L62 A33 L75 L72 | L53 L54 L55 A4 L4 | L4 A4 L55 A38 L56 L53
sketch "스케치15" plane through (0, 0, 0) normal (0, 0, -1) x (-1, 0, 0)
  circle A0 centre (0, -14) radius 1.6 projected
  line L0 (-29, 25.8) -> (29, 25.8) projected
  line L1 (-29, 19.8) -> (-29, 25.8) projected
  line L2 (-35, 19.8) -> (-29, 19.8) projected
  line L3 (-35, 25.8) -> (-35, 19.8) projected
  line L4 (-69, 25.8) -> (-35, 25.8) projected
  line L5 (-69, 19.8) -> (-69, 25.8) projected
  line L6 (-75, 19.8) -> (-69, 19.8) projected
  line L7 (-75, -93.4) -> (-75, 19.8) projected
  line L8 (-69, -93.4) -> (-75, -93.4) projected
  line L9 (-69, -99.4) -> (-69, -93.4) projected
  line L10 (-35, -99.4) -> (-69, -99.4) projected
  line L11 (-35, -93.4) -> (-35, -99.4) projected
  line L12 (-29, -93.4) -> (-35, -93.4) projected
  line L13 (-29, -99.4) -> (-29, -93.4) projected
  line L14 (29, -99.4) -> (-29, -99.4) projected
  line L15 (29, -93.4) -> (29, -99.4) projected
  line L16 (35, -93.4) -> (29, -93.4) projected
  line L17 (35, -99.4) -> (35, -93.4) projected
  line L18 (69, -99.4) -> (35, -99.4) projected
  line L19 (69, -93.4) -> (69, -99.4) projected
  line L20 (75, -93.4) -> (69, -93.4) projected
  line L21 (75, 19.8) -> (75, -93.4) projected
  line L22 (69, 19.8) -> (75, 19.8) projected
  line L23 (69, 25.8) -> (69, 19.8) projected
  line L24 (35, 25.8) -> (69, 25.8) projected
  line L25 (35, 19.8) -> (35, 25.8) projected
  line L26 (29, 19.8) -> (35, 19.8) projected
  line L27 (29, 25.8) -> (29, 19.8) projected
  line L28 (-14.7, -29) -> (-74.8, -29) projected
  line L29 (-74.8, -29) -> (75.2, -29)
  line L30 (75.2, -29) -> (75.2, -99.4)
  line L31 (75.2, -99.4) -> (-74.8, -99.4)
  line L32 (-74.8, -99.4) -> (-74.8, -29)
  line L33 (-69, -76.4) -> (-69, -82.4) projected
  line L34 (-69, -76.4) -> (-75, -76.4) projected
  line L35 (-75, -82.4) -> (-75, -76.4) projected
  line L36 (-69, -82.4) -> (-75, -82.4) projected
  line L37 (-69, -41.4) -> (-75, -41.4) projected
  line L38 (-75, -41.4) -> (-75, -47.4) projected
  line L39 (-69, -47.4) -> (-75, -47.4) projected
  line L40 (-69, -41.4) -> (-69, -47.4) projected
  line L41 (-69, -47.4) -> (-69, -53.4) projected
  line L42 (-69, -47.4) -> (-75, -47.4) projected
  line L43 (-75, -53.4) -> (-75, -47.4) projected
  line L44 (-69, -53.4) -> (-75, -53.4) projected
  line L45 (-29, -41.4) -> (-35, -41.4) projected
  line L46 (-35, -41.4) -> (-35, -47.4) projected
  line L47 (-29, -47.4) -> (-35, -47.4) projected
  line L48 (-29, -41.4) -> (-29, -47.4) projected
  line L49 (75, -76.4) -> (75, -82.4) projected
  line L50 (75, -76.4) -> (69, -76.4) projected
  line L51 (69, -82.4) -> (69, -76.4) projected
  line L52 (75, -82.4) -> (69, -82.4) projected
  line L53 (35, -41.4) -> (35, -47.4) projected
  line L54 (69, -47.4) -> (35, -47.4) projected
  line L55 (69, -41.4) -> (69, -47.4) projected
  line L56 (35, -41.4) -> (69, -41.4) projected
  line L57 (75, -41.4) -> (69, -41.4) projected
  line L58 (69, -41.4) -> (69, -47.4) projected
  line L59 (75, -47.4) -> (69, -47.4) projected
  line L60 (75, -41.4) -> (75, -47.4) projected
  line L61 (35, -41.4) -> (29, -41.4) projected
  line L62 (29, -41.4) -> (29, -47.4) projected
  line L63 (35, -47.4) -> (29, -47.4) projected
  line L64 (35, -41.4) -> (35, -47.4) projected
  point P0 (0, 0)
  point P1 (75, -29)
  point P2 (-74.8, -93.4)
  point P3 (-74.8, -41.4)
  point P4 (-74.8, -47.4)
  point P5 (-74.8, -53.4)
  point P6 (-74.8, -76.4)
  point P7 (-74.8, -82.4)
extrude "돌출10" add sketch "스케치15" against normal blind 6 contours A0 | L37 L32 L39 L7 | L21 L57 L56 L61 L62 L63 L54 L59 L50 L51 L52 L20 L19 L18 L17 L16 L15 L14 L13 L12 L11 L10 L9 L8 L32 L36 L33 L34 L44 L41 L40 L37 L28 L29 | L39 L32 L44 L7 | L44 L32 L34 L7 | L55 L54 L53 L56 | L34 L32 L36 L7 | L36 L32 L8 L7
sketch "스케치20" plane through (-75, -93.4, 6) normal (0, 0, 1) x (1, 0, 0)
  line L0 (150, 52) -> (150, 0) projected
  arc A0 (95.7, 125.1) -> (92.7, 128.1) centre (92.7, 125.1) ccw projected
  line L1 (149.8, 100.05) -> (92.7, 100.05)
  line L2 (92.7, 100.05) -> (92.7, 128.1)
  line L3 (92.7, 128.1) -> (149.8, 128.1)
  line L4 (149.8, 128.1) -> (149.8, 100.05)
  arc A1 (57.3, 128.1) -> (54.3, 125.1) centre (57.3, 125.1) ccw projected
  line L5 (57.3, 128.1) -> (-0.4, 128.1)
  line L6 (-0.4, 128.1) -> (-0.4, 100.05)
  line L7 (-0.4, 100.05) -> (57.3, 100.05)
  line L8 (57.3, 100.05) -> (57.3, 128.1)
  point P0 (75, 93.4)
  point P1 (150, 113.2)
  point P2 (150, 0)
extrude "돌출14" add sketch "스케치20" against normal blind 5.8
sketch "스케치24" plane through (-75.4, 34.7, 6) normal (0, 1, 0) x (1, 0, 0)
  line L0 (150.2, 0) -> (0, 0) projected
  line L1 (150.2, 0) -> (150.2, 5.8) projected
  line L2 (0, 0) -> (0, 5.8) projected
  line L3 (0, 5.8) -> (57.7, 5.8) projected
  line L4 (93.1, 5.8) -> (150.2, 5.8) projected
  line L5 (93.1, 5.8) -> (93.1, 6) projected
  line L6 (57.7, 6) -> (93.1, 6) projected
  line L7 (57.7, 5.8) -> (57.7, 6) projected
  point P0 (75.4, 6)
extrude "돌출17" add sketch "스케치24" along normal blind 8
properties part number "real_waist" material "PMMA 플라스틱"
